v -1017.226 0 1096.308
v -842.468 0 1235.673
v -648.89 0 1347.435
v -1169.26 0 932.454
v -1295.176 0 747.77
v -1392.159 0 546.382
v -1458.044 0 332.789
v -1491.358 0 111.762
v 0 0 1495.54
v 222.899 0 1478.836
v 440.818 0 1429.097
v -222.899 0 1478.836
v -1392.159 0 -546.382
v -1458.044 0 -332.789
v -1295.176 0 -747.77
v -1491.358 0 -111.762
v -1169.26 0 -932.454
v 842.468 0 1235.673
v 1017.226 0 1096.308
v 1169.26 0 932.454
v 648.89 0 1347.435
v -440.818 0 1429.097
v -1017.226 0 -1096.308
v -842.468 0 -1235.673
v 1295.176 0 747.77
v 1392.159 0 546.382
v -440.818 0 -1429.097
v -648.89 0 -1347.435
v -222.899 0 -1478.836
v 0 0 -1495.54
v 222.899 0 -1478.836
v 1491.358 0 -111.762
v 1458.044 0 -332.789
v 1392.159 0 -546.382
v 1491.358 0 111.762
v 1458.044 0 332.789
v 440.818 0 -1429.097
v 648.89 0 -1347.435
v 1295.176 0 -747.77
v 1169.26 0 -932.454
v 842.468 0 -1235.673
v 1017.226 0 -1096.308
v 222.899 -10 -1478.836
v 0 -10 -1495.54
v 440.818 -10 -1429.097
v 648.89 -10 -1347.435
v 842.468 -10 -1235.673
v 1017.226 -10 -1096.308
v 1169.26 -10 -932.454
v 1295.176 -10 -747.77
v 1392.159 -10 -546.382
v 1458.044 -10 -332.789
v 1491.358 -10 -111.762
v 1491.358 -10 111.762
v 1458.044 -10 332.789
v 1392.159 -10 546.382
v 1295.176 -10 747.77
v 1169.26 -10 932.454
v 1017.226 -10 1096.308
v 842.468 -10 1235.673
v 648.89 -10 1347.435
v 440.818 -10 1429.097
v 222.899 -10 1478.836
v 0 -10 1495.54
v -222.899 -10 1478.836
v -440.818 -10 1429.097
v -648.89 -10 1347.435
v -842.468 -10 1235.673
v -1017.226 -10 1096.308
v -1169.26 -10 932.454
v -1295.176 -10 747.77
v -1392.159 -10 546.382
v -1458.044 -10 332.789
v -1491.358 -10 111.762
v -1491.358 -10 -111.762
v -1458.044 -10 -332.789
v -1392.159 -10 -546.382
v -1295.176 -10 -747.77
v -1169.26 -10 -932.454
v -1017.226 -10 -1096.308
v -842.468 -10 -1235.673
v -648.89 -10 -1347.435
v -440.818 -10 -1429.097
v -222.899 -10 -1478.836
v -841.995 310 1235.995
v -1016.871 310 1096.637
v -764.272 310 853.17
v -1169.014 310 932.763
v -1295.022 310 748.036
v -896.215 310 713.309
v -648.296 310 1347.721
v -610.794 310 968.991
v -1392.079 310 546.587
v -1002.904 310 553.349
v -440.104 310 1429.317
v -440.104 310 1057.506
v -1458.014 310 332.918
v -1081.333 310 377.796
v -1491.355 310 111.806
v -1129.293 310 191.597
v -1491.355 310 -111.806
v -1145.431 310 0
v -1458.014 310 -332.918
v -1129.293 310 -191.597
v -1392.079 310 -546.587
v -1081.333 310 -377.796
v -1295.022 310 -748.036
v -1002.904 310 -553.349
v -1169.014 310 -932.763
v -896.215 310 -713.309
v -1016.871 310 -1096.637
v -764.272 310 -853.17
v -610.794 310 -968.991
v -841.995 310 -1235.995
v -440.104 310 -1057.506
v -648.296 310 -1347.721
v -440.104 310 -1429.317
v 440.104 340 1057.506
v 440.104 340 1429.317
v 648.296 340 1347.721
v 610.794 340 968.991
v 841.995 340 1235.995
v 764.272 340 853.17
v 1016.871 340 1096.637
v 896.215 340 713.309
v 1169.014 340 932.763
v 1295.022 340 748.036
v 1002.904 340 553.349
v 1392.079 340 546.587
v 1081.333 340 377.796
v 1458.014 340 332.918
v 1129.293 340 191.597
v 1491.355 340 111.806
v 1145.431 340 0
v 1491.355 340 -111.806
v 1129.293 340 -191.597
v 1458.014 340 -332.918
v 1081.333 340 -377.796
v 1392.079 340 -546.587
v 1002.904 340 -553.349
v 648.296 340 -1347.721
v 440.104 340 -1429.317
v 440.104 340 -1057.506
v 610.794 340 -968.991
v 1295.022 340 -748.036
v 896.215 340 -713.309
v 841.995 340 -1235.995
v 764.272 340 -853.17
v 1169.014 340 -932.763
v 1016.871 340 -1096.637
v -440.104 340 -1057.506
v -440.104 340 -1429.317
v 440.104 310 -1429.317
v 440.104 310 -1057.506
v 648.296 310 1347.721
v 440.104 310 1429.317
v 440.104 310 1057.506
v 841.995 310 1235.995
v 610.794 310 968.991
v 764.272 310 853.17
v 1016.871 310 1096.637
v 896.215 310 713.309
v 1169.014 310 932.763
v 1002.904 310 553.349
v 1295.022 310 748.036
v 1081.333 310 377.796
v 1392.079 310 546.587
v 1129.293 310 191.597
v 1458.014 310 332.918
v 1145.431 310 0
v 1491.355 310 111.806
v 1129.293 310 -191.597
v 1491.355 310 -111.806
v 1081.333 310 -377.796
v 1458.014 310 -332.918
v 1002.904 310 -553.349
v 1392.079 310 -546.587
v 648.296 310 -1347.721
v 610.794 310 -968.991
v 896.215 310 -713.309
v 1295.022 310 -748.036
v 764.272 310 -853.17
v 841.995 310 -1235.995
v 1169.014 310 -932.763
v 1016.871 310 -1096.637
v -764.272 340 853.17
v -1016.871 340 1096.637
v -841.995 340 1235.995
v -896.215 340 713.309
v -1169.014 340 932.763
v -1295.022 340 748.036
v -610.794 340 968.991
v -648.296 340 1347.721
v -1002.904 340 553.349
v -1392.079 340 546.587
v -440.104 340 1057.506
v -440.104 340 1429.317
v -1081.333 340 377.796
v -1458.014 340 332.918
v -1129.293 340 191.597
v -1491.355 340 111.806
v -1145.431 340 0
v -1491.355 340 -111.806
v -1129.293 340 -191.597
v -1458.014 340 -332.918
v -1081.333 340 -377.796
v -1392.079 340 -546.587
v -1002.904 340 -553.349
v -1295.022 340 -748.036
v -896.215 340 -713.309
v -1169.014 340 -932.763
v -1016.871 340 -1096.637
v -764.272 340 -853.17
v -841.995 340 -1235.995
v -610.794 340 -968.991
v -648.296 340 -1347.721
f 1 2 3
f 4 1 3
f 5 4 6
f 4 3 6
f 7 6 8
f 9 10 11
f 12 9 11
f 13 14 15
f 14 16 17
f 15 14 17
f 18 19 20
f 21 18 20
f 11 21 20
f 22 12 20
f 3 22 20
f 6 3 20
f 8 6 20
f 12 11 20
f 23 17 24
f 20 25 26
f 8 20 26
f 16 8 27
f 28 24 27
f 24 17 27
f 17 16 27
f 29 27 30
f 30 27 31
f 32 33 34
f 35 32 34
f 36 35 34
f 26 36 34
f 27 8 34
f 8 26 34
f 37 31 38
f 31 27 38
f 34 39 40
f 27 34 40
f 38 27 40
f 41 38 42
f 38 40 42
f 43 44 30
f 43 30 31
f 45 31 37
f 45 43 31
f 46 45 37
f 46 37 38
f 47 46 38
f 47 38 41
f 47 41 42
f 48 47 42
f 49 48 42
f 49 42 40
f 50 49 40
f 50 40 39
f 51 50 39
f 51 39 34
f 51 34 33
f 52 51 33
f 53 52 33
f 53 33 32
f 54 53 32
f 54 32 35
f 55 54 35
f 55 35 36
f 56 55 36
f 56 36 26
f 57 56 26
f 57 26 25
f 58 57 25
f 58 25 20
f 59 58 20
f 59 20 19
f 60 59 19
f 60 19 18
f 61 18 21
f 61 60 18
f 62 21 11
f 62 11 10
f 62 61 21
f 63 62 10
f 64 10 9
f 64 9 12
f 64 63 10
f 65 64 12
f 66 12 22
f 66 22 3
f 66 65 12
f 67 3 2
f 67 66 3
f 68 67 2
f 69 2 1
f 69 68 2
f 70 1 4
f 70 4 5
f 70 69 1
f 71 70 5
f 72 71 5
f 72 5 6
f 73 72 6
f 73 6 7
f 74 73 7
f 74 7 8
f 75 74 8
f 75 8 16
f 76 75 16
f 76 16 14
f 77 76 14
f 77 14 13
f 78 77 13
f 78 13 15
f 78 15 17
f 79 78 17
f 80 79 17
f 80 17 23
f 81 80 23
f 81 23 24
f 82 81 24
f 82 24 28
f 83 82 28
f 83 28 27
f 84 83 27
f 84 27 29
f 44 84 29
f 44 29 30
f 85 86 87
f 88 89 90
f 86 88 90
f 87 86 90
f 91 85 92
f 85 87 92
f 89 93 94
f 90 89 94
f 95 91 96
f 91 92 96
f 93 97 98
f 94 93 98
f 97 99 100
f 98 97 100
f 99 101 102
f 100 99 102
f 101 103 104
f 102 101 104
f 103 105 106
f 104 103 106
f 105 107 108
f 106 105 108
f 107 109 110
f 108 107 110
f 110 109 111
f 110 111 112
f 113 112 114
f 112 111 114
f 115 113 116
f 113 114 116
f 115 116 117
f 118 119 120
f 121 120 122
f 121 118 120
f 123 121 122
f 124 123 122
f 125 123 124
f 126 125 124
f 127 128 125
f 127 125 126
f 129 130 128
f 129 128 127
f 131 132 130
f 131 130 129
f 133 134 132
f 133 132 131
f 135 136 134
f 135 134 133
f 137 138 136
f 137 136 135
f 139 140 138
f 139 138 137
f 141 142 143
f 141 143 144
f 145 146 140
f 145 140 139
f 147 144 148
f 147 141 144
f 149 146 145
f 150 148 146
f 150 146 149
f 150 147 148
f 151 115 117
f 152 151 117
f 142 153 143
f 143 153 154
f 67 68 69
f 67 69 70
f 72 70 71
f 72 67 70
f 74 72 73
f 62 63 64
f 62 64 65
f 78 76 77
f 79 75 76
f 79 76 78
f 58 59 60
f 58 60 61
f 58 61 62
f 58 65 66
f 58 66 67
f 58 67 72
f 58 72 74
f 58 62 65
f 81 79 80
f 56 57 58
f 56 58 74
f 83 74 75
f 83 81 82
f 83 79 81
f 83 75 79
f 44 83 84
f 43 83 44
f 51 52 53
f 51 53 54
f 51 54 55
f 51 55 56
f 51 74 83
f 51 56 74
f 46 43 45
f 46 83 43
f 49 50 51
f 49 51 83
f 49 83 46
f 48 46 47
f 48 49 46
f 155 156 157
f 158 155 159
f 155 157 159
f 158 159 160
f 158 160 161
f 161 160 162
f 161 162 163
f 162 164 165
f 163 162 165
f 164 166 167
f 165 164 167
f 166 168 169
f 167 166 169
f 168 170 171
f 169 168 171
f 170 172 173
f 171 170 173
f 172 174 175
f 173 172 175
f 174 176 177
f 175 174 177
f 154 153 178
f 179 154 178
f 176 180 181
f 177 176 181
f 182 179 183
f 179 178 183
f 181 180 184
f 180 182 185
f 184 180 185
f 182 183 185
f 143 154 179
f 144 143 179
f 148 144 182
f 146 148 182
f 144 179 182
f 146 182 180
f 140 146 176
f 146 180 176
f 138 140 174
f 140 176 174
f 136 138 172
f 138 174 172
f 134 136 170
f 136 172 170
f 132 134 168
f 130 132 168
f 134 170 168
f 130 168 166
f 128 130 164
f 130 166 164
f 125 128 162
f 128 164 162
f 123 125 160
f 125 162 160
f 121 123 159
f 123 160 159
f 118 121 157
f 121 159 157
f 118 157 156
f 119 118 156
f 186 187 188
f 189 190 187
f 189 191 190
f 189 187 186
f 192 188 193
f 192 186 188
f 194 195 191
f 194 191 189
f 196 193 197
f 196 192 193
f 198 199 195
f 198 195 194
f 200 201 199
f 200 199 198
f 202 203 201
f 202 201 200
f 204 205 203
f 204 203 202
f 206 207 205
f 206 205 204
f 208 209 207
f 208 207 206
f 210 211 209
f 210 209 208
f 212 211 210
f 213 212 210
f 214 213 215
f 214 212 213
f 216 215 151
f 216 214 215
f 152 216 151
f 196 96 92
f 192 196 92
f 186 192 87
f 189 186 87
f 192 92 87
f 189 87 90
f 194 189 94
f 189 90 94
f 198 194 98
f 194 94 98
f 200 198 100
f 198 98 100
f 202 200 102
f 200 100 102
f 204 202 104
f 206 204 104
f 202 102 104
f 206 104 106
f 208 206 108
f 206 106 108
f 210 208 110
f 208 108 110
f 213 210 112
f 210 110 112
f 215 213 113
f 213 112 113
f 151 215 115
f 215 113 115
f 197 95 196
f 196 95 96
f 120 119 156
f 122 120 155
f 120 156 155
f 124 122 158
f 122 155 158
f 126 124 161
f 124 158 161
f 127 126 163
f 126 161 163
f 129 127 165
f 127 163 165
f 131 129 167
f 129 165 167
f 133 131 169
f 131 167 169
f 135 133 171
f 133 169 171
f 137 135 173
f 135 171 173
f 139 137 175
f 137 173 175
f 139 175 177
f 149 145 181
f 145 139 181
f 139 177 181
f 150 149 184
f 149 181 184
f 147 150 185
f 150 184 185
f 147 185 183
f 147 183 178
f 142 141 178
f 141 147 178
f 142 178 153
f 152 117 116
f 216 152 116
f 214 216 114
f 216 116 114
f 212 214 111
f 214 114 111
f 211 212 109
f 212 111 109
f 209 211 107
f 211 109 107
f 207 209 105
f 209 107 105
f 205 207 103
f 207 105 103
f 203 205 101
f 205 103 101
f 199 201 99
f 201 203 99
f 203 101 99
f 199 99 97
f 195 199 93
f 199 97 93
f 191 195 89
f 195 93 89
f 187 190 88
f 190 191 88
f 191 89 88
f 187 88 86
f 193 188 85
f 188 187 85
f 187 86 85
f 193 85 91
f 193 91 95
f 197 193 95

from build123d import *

# Parameters (mm, degrees)
BOSS_EXTRUDE4_DEPTH     = 650
BOSS_EXTRUDE4_2_DEPTH   = 650
BOSS_EXTRUDE5_START     = 10
SKETCH3_R               = 1495.54
BOSS_EXTRUDE5_DEPTH     = 10
CUT_EXTRUDE1_DEPTH      = 2213.640906971
CUT_EXTRUDE1_DEPTH_BACK = 2213.640906971
SKETCH4_W               = 3005.574253275
SKETCH4_H               = 310
CUT_EXTRUDE2_DEPTH      = 2143.167076397
CUT_EXTRUDE2_DEPTH_BACK = 2143.167076397
SKETCH5_W               = 2991.08
SKETCH5_H               = 310


with BuildPart() as part:
    # Sketch1 → Boss-Extrude4 (new body)
    with BuildSketch(Plane(origin=(0, 0, 0), x_dir=(1, 0, 0), z_dir=(0, 1, 0))):
        with BuildLine():
            ThreePointArc((440.10401327, 1057.506475536), (1145.43069991, 0), (440.10401327, -1057.506475536))
            Line((440.10401327, -1057.506475536), (440.10401327, -1429.317441685))
            ThreePointArc((440.10401327, -1429.317441685), (1203.086249528, -888.382444557), (1495.54, 0))
            ThreePointArc((1495.54, 0), (1203.086249528, 888.382444557), (440.10401327, 1429.317441685))
            Line((440.10401327, 1429.317441685), (440.10401327, 1057.506475536))
        make_face()
    extrude(amount=BOSS_EXTRUDE4_DEPTH)



with BuildPart() as body_2:
    # Sketch1 → Boss-Extrude4 2 (new body)
    with BuildSketch(Plane(origin=(0, 0, 0), x_dir=(1, 0, 0), z_dir=(0, 1, 0))):
        with BuildLine():
            ThreePointArc((-440.10401327, 1429.317441685), (-1495.54, 0), (-440.10401327, -1429.317441685))
            Line((-440.10401327, -1429.317441685), (-440.10401327, -1057.506475536))
            ThreePointArc((-440.10401327, -1057.506475536), (-1145.43069991, 0), (-440.10401327, 1057.506475536))
            Line((-440.10401327, 1057.506475536), (-440.10401327, 1429.317441685))
        make_face()
    extrude(amount=BOSS_EXTRUDE4_2_DEPTH)


with BuildPart() as part_1:
    add(part.part)

    add(body_2.part)  # Boss-Extrude5 merges body 2
    # Sketch3 → Boss-Extrude5 (add)
    with BuildSketch(Plane.XZ.offset(BOSS_EXTRUDE5_START)):
        with Locations(Location((0, 0, 0), (0, 0, 270))):
            Circle(SKETCH3_R)
    extrude(amount=-BOSS_EXTRUDE5_DEPTH)

    # Sketch4 → Cut-Extrude1 (cut, two sides: drawn at the far end of the back side and taken through both)
    with BuildSketch(Plane.XY.offset(-CUT_EXTRUDE1_DEPTH_BACK)):
        with Locations((7.247126637, 495)):
            Rectangle(SKETCH4_W, SKETCH4_H)
    extrude(amount=CUT_EXTRUDE1_DEPTH + CUT_EXTRUDE1_DEPTH_BACK, mode=Mode.SUBTRACT)

    # Sketch5 → Cut-Extrude2 (cut, two sides: drawn at the far end of the back side and taken through both)
    with BuildSketch(Plane.XY.offset(-CUT_EXTRUDE2_DEPTH_BACK)):
        with Locations((0, 155)):
            Rectangle(SKETCH5_W, SKETCH5_H)
    extrude(amount=CUT_EXTRUDE2_DEPTH + CUT_EXTRUDE2_DEPTH_BACK, mode=Mode.SUBTRACT)


with BuildPart() as cut_extrude2_piece_1:
    # of the separate pieces the step leaves, piece 1, a body of its own (cut_extrude2_pieces)
    add(part_1.part.solids().sort_by_distance((0, -10, -1495.54))[0])


with BuildPart() as cut_extrude2_piece_2:
    # of the separate pieces the step leaves, piece 2, a body of its own (cut_extrude2_pieces)
    add(part_1.part.solids().sort_by_distance((440.10401327, 310, 1429.317441685))[0])


with BuildPart() as cut_extrude2_piece_3:
    # of the separate pieces the step leaves, piece 3, a body of its own (cut_extrude2_pieces)
    add(part_1.part.solids().sort_by_distance((-440.10401327, 310, -1429.317441685))[0])


solid = Compound([cut_extrude2_piece_1.part, cut_extrude2_piece_2.part, cut_extrude2_piece_3.part])
